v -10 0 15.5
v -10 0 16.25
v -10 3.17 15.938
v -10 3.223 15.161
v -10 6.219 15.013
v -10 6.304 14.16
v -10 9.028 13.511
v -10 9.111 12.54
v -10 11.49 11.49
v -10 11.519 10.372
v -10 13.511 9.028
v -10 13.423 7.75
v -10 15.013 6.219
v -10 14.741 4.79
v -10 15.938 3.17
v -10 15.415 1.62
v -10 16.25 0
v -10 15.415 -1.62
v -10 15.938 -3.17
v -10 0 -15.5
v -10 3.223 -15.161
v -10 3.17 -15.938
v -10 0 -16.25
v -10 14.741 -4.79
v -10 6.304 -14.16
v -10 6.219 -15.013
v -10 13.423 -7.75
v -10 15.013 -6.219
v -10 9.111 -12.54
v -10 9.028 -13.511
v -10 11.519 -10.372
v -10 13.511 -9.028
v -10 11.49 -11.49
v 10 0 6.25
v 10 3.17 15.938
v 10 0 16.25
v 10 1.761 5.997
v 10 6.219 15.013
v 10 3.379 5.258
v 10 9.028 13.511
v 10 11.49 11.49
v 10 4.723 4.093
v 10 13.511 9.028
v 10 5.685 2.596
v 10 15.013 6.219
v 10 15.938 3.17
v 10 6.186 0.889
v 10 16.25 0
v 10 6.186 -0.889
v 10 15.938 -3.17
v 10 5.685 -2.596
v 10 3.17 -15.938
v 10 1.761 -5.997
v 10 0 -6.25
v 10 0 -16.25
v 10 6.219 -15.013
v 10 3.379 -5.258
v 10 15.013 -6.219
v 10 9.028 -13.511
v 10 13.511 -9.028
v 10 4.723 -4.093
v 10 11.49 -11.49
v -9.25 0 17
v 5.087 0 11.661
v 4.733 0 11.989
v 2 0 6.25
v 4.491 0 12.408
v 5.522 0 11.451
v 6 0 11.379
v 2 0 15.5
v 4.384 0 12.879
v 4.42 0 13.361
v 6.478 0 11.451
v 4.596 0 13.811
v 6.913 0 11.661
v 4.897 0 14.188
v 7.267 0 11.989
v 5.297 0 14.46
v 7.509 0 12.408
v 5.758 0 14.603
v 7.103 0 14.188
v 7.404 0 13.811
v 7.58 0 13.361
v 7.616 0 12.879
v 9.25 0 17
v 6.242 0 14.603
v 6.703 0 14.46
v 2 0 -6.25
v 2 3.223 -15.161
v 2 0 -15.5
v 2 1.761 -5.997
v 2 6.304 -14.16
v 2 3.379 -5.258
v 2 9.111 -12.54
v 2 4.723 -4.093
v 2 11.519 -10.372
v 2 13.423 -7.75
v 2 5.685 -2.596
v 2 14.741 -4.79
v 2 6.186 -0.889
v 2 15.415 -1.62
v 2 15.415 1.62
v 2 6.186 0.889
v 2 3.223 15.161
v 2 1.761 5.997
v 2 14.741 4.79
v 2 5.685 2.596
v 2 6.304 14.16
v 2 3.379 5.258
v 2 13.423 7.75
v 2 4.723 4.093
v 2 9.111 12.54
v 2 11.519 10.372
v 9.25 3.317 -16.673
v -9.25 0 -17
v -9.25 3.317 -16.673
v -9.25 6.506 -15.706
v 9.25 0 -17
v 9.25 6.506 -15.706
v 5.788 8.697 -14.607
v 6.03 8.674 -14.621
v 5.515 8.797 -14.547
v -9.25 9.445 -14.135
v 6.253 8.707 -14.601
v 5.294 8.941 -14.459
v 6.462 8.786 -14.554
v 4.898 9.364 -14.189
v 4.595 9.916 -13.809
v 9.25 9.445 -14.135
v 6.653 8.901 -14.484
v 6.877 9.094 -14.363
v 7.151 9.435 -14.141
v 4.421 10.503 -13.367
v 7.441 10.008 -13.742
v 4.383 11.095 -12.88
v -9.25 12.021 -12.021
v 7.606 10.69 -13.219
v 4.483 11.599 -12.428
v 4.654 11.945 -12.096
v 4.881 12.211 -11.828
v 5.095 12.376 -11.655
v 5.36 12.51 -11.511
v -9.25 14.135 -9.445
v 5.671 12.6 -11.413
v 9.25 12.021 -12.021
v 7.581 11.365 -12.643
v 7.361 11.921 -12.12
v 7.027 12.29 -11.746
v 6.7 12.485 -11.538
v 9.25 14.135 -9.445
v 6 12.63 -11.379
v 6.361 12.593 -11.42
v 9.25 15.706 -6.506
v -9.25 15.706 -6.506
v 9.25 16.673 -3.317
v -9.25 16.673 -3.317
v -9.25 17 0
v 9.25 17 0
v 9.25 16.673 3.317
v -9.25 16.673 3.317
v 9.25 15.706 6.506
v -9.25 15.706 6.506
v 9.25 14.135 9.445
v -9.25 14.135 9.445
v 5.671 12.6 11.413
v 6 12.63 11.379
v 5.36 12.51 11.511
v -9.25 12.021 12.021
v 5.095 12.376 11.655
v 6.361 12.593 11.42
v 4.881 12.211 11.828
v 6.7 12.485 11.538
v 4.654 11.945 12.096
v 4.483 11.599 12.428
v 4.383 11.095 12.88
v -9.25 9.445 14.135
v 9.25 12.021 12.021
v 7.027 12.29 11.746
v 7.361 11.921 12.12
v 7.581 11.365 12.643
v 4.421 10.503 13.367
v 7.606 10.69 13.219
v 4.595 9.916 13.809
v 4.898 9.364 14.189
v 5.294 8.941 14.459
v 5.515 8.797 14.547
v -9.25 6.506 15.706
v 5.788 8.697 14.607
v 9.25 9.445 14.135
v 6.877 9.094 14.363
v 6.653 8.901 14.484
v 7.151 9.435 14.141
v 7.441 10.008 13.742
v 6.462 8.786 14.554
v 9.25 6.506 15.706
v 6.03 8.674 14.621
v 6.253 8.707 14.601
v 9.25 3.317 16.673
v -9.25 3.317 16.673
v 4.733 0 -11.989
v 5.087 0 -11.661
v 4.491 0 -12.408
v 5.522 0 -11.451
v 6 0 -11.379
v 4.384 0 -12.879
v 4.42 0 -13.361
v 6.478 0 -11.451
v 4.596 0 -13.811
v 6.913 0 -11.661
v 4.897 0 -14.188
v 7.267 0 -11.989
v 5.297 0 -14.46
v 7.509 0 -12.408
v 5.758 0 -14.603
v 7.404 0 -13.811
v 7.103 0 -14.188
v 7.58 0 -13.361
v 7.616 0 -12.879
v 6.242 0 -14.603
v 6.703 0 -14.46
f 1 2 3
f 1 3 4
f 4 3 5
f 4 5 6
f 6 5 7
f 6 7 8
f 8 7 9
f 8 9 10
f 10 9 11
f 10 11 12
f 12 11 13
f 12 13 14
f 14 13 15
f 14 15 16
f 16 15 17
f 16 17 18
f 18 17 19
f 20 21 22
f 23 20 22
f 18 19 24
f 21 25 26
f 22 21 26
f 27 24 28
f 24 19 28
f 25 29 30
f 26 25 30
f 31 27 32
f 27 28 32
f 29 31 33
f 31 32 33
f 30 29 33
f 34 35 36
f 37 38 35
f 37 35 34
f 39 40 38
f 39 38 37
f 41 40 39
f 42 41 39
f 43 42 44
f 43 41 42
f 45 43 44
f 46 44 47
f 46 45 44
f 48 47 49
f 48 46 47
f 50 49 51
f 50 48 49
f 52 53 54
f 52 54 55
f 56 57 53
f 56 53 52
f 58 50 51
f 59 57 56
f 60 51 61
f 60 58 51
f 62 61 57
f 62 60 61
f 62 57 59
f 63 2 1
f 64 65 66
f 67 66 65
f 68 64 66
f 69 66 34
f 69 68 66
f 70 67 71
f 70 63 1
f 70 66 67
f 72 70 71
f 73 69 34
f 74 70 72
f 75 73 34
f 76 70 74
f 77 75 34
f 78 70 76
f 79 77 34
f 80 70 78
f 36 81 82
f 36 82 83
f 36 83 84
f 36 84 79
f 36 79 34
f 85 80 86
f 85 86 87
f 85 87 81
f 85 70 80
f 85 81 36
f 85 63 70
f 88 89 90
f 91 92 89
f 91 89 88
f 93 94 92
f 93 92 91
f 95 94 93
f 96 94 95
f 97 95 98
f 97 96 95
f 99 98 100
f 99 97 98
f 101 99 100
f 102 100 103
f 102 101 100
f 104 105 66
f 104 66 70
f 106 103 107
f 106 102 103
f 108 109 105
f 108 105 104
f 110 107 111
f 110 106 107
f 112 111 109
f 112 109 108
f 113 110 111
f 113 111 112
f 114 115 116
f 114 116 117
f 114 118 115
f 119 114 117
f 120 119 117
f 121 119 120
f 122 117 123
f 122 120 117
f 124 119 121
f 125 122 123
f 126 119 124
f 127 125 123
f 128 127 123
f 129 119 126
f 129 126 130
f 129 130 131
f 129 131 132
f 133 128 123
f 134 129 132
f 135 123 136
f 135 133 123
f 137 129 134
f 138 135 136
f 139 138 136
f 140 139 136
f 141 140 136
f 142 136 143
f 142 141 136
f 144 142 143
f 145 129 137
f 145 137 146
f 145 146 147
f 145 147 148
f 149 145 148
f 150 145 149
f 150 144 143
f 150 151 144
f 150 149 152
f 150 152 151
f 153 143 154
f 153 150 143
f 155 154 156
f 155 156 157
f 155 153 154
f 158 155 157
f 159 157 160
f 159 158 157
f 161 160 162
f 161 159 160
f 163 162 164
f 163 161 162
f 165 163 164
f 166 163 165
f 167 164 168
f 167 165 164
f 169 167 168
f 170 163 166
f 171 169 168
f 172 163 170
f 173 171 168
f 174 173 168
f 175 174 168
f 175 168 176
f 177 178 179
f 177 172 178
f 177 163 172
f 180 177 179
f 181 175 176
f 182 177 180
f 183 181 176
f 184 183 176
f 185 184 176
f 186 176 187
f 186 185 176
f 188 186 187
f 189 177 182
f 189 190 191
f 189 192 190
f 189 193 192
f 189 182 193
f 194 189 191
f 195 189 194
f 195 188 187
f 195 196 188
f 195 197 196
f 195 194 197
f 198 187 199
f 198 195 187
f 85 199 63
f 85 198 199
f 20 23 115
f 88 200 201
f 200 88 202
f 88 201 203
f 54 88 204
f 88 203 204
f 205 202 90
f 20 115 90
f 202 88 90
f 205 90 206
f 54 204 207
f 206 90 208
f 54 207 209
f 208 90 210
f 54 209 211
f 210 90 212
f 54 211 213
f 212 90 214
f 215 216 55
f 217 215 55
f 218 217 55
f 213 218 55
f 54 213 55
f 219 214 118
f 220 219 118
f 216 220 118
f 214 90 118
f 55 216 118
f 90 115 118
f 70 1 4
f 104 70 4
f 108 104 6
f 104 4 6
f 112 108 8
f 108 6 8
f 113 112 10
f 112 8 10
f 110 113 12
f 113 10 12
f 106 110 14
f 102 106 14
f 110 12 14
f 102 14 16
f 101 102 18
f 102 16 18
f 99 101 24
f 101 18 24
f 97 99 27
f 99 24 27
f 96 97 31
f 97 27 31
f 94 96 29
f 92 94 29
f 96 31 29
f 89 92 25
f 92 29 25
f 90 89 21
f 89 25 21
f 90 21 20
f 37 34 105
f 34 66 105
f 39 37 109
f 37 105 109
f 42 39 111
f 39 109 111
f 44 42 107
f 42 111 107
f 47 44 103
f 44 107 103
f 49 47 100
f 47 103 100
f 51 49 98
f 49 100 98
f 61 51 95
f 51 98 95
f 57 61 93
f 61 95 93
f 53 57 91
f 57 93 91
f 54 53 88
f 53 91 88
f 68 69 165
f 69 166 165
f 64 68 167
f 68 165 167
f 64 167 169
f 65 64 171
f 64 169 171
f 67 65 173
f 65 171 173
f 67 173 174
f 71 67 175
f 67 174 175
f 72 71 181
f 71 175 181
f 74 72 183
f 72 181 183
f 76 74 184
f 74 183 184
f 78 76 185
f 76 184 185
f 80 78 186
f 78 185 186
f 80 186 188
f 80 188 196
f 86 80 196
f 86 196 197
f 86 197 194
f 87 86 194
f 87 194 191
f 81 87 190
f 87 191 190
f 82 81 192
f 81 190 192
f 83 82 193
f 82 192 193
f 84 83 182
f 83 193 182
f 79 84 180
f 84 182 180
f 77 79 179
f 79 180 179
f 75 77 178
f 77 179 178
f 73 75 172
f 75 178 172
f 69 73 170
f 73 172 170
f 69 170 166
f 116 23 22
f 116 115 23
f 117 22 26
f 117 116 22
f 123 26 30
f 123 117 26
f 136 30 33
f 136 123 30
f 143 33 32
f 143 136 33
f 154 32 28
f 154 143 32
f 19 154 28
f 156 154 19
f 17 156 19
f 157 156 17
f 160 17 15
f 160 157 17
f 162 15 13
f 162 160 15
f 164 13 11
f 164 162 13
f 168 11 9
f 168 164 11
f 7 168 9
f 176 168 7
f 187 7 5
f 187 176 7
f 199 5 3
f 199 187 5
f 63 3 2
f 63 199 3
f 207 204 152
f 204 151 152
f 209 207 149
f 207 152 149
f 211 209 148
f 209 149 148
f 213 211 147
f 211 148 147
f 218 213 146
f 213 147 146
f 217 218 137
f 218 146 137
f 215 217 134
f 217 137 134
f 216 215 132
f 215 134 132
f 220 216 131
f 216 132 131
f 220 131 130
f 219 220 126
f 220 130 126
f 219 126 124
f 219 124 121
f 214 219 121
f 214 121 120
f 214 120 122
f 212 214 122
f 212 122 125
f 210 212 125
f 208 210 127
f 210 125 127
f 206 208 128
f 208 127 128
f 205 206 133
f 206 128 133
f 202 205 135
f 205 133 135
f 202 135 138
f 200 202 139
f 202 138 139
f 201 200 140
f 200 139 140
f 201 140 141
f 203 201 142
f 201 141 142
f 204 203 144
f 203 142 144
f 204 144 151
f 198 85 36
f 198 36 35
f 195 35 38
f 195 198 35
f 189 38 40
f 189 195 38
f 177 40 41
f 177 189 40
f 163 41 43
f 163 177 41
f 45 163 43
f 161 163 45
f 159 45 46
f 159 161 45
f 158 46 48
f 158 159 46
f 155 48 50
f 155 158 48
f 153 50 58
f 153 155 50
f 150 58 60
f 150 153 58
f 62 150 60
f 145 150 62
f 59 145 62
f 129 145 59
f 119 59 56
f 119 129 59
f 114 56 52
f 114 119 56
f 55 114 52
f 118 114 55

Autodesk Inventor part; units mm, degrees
ref_plane "YZ Plane" through (0, 0, 0) normal (1, 0, 0) x (0, 1, 0)
ref_plane "XZ Plane" through (0, 0, 0) normal (0, 1, 0) x (-1, 0, 0)
ref_plane "XY Plane" through (0, 0, 0) normal (0, 0, 1) x (1, 0, 0)
sketch "スケッチ1" plane through (0, 0, 0) normal (0, 0, 1) x (1, 0, 0)
  line L0 (0, 0) -> (0, 6.25) construction
  line L1 (0, 6.25) -> (-10, 6.25)
  line L2 (-10, 6.25) -> (-10, 17)
  line L3 (-10, 17) -> (0, 17)
  line L4 (0, 6.25) -> (10, 6.25)
  line L5 (10, 6.25) -> (10, 17)
  line L6 (10, 17) -> (0, 17)
  line L7 (-14, 0) -> (14, 0) projected
  dimension "d0" = 6.25
  dimension "d1" = 10
  dimension "d2" = 10.75
revolve "回転1" add sketch "スケッチ1" angle 180 mid plane about axis through (-10, 0, 0) along (1, 0, 0)
sketch "スケッチ2" plane through (-10, 0, 17) normal (0, -1, 0) x (1, 0, 0)
  line L0 (20, 0) -> (0, 0) projected
  line L1 (20, -10.75) -> (20, 0) projected
  point P0 (10, -17)
  point P1 (16, -4)
  dimension "d4" = 4
  dimension "d5" = 4
hole "穴1" at (6, 0, 13) direction (0, 1, 0) diameter 3.242 end through all thread size "M4x0.7" class "6H" standard "ANSI Metric M Profile"
mirror "ミラー1" about plane through (0, 0, 0) normal (0, 0, 1) of "穴1"
sketch "スケッチ3" plane through (-10, 0, -17) normal (-1, 0, 0) x (0, 0, 1)
  circle A0 centre (17, 0) radius 15.5
  dimension "d16" = 31
extrude "押し出し1" cut sketch "スケッチ3" against normal blind 12
chamfer "面取り2" distance 0.75 angle 45 2 edges at (10, 17, 0) (-10, 17, 0)
properties part number "probe-cover" material "ステンレス鋼"
